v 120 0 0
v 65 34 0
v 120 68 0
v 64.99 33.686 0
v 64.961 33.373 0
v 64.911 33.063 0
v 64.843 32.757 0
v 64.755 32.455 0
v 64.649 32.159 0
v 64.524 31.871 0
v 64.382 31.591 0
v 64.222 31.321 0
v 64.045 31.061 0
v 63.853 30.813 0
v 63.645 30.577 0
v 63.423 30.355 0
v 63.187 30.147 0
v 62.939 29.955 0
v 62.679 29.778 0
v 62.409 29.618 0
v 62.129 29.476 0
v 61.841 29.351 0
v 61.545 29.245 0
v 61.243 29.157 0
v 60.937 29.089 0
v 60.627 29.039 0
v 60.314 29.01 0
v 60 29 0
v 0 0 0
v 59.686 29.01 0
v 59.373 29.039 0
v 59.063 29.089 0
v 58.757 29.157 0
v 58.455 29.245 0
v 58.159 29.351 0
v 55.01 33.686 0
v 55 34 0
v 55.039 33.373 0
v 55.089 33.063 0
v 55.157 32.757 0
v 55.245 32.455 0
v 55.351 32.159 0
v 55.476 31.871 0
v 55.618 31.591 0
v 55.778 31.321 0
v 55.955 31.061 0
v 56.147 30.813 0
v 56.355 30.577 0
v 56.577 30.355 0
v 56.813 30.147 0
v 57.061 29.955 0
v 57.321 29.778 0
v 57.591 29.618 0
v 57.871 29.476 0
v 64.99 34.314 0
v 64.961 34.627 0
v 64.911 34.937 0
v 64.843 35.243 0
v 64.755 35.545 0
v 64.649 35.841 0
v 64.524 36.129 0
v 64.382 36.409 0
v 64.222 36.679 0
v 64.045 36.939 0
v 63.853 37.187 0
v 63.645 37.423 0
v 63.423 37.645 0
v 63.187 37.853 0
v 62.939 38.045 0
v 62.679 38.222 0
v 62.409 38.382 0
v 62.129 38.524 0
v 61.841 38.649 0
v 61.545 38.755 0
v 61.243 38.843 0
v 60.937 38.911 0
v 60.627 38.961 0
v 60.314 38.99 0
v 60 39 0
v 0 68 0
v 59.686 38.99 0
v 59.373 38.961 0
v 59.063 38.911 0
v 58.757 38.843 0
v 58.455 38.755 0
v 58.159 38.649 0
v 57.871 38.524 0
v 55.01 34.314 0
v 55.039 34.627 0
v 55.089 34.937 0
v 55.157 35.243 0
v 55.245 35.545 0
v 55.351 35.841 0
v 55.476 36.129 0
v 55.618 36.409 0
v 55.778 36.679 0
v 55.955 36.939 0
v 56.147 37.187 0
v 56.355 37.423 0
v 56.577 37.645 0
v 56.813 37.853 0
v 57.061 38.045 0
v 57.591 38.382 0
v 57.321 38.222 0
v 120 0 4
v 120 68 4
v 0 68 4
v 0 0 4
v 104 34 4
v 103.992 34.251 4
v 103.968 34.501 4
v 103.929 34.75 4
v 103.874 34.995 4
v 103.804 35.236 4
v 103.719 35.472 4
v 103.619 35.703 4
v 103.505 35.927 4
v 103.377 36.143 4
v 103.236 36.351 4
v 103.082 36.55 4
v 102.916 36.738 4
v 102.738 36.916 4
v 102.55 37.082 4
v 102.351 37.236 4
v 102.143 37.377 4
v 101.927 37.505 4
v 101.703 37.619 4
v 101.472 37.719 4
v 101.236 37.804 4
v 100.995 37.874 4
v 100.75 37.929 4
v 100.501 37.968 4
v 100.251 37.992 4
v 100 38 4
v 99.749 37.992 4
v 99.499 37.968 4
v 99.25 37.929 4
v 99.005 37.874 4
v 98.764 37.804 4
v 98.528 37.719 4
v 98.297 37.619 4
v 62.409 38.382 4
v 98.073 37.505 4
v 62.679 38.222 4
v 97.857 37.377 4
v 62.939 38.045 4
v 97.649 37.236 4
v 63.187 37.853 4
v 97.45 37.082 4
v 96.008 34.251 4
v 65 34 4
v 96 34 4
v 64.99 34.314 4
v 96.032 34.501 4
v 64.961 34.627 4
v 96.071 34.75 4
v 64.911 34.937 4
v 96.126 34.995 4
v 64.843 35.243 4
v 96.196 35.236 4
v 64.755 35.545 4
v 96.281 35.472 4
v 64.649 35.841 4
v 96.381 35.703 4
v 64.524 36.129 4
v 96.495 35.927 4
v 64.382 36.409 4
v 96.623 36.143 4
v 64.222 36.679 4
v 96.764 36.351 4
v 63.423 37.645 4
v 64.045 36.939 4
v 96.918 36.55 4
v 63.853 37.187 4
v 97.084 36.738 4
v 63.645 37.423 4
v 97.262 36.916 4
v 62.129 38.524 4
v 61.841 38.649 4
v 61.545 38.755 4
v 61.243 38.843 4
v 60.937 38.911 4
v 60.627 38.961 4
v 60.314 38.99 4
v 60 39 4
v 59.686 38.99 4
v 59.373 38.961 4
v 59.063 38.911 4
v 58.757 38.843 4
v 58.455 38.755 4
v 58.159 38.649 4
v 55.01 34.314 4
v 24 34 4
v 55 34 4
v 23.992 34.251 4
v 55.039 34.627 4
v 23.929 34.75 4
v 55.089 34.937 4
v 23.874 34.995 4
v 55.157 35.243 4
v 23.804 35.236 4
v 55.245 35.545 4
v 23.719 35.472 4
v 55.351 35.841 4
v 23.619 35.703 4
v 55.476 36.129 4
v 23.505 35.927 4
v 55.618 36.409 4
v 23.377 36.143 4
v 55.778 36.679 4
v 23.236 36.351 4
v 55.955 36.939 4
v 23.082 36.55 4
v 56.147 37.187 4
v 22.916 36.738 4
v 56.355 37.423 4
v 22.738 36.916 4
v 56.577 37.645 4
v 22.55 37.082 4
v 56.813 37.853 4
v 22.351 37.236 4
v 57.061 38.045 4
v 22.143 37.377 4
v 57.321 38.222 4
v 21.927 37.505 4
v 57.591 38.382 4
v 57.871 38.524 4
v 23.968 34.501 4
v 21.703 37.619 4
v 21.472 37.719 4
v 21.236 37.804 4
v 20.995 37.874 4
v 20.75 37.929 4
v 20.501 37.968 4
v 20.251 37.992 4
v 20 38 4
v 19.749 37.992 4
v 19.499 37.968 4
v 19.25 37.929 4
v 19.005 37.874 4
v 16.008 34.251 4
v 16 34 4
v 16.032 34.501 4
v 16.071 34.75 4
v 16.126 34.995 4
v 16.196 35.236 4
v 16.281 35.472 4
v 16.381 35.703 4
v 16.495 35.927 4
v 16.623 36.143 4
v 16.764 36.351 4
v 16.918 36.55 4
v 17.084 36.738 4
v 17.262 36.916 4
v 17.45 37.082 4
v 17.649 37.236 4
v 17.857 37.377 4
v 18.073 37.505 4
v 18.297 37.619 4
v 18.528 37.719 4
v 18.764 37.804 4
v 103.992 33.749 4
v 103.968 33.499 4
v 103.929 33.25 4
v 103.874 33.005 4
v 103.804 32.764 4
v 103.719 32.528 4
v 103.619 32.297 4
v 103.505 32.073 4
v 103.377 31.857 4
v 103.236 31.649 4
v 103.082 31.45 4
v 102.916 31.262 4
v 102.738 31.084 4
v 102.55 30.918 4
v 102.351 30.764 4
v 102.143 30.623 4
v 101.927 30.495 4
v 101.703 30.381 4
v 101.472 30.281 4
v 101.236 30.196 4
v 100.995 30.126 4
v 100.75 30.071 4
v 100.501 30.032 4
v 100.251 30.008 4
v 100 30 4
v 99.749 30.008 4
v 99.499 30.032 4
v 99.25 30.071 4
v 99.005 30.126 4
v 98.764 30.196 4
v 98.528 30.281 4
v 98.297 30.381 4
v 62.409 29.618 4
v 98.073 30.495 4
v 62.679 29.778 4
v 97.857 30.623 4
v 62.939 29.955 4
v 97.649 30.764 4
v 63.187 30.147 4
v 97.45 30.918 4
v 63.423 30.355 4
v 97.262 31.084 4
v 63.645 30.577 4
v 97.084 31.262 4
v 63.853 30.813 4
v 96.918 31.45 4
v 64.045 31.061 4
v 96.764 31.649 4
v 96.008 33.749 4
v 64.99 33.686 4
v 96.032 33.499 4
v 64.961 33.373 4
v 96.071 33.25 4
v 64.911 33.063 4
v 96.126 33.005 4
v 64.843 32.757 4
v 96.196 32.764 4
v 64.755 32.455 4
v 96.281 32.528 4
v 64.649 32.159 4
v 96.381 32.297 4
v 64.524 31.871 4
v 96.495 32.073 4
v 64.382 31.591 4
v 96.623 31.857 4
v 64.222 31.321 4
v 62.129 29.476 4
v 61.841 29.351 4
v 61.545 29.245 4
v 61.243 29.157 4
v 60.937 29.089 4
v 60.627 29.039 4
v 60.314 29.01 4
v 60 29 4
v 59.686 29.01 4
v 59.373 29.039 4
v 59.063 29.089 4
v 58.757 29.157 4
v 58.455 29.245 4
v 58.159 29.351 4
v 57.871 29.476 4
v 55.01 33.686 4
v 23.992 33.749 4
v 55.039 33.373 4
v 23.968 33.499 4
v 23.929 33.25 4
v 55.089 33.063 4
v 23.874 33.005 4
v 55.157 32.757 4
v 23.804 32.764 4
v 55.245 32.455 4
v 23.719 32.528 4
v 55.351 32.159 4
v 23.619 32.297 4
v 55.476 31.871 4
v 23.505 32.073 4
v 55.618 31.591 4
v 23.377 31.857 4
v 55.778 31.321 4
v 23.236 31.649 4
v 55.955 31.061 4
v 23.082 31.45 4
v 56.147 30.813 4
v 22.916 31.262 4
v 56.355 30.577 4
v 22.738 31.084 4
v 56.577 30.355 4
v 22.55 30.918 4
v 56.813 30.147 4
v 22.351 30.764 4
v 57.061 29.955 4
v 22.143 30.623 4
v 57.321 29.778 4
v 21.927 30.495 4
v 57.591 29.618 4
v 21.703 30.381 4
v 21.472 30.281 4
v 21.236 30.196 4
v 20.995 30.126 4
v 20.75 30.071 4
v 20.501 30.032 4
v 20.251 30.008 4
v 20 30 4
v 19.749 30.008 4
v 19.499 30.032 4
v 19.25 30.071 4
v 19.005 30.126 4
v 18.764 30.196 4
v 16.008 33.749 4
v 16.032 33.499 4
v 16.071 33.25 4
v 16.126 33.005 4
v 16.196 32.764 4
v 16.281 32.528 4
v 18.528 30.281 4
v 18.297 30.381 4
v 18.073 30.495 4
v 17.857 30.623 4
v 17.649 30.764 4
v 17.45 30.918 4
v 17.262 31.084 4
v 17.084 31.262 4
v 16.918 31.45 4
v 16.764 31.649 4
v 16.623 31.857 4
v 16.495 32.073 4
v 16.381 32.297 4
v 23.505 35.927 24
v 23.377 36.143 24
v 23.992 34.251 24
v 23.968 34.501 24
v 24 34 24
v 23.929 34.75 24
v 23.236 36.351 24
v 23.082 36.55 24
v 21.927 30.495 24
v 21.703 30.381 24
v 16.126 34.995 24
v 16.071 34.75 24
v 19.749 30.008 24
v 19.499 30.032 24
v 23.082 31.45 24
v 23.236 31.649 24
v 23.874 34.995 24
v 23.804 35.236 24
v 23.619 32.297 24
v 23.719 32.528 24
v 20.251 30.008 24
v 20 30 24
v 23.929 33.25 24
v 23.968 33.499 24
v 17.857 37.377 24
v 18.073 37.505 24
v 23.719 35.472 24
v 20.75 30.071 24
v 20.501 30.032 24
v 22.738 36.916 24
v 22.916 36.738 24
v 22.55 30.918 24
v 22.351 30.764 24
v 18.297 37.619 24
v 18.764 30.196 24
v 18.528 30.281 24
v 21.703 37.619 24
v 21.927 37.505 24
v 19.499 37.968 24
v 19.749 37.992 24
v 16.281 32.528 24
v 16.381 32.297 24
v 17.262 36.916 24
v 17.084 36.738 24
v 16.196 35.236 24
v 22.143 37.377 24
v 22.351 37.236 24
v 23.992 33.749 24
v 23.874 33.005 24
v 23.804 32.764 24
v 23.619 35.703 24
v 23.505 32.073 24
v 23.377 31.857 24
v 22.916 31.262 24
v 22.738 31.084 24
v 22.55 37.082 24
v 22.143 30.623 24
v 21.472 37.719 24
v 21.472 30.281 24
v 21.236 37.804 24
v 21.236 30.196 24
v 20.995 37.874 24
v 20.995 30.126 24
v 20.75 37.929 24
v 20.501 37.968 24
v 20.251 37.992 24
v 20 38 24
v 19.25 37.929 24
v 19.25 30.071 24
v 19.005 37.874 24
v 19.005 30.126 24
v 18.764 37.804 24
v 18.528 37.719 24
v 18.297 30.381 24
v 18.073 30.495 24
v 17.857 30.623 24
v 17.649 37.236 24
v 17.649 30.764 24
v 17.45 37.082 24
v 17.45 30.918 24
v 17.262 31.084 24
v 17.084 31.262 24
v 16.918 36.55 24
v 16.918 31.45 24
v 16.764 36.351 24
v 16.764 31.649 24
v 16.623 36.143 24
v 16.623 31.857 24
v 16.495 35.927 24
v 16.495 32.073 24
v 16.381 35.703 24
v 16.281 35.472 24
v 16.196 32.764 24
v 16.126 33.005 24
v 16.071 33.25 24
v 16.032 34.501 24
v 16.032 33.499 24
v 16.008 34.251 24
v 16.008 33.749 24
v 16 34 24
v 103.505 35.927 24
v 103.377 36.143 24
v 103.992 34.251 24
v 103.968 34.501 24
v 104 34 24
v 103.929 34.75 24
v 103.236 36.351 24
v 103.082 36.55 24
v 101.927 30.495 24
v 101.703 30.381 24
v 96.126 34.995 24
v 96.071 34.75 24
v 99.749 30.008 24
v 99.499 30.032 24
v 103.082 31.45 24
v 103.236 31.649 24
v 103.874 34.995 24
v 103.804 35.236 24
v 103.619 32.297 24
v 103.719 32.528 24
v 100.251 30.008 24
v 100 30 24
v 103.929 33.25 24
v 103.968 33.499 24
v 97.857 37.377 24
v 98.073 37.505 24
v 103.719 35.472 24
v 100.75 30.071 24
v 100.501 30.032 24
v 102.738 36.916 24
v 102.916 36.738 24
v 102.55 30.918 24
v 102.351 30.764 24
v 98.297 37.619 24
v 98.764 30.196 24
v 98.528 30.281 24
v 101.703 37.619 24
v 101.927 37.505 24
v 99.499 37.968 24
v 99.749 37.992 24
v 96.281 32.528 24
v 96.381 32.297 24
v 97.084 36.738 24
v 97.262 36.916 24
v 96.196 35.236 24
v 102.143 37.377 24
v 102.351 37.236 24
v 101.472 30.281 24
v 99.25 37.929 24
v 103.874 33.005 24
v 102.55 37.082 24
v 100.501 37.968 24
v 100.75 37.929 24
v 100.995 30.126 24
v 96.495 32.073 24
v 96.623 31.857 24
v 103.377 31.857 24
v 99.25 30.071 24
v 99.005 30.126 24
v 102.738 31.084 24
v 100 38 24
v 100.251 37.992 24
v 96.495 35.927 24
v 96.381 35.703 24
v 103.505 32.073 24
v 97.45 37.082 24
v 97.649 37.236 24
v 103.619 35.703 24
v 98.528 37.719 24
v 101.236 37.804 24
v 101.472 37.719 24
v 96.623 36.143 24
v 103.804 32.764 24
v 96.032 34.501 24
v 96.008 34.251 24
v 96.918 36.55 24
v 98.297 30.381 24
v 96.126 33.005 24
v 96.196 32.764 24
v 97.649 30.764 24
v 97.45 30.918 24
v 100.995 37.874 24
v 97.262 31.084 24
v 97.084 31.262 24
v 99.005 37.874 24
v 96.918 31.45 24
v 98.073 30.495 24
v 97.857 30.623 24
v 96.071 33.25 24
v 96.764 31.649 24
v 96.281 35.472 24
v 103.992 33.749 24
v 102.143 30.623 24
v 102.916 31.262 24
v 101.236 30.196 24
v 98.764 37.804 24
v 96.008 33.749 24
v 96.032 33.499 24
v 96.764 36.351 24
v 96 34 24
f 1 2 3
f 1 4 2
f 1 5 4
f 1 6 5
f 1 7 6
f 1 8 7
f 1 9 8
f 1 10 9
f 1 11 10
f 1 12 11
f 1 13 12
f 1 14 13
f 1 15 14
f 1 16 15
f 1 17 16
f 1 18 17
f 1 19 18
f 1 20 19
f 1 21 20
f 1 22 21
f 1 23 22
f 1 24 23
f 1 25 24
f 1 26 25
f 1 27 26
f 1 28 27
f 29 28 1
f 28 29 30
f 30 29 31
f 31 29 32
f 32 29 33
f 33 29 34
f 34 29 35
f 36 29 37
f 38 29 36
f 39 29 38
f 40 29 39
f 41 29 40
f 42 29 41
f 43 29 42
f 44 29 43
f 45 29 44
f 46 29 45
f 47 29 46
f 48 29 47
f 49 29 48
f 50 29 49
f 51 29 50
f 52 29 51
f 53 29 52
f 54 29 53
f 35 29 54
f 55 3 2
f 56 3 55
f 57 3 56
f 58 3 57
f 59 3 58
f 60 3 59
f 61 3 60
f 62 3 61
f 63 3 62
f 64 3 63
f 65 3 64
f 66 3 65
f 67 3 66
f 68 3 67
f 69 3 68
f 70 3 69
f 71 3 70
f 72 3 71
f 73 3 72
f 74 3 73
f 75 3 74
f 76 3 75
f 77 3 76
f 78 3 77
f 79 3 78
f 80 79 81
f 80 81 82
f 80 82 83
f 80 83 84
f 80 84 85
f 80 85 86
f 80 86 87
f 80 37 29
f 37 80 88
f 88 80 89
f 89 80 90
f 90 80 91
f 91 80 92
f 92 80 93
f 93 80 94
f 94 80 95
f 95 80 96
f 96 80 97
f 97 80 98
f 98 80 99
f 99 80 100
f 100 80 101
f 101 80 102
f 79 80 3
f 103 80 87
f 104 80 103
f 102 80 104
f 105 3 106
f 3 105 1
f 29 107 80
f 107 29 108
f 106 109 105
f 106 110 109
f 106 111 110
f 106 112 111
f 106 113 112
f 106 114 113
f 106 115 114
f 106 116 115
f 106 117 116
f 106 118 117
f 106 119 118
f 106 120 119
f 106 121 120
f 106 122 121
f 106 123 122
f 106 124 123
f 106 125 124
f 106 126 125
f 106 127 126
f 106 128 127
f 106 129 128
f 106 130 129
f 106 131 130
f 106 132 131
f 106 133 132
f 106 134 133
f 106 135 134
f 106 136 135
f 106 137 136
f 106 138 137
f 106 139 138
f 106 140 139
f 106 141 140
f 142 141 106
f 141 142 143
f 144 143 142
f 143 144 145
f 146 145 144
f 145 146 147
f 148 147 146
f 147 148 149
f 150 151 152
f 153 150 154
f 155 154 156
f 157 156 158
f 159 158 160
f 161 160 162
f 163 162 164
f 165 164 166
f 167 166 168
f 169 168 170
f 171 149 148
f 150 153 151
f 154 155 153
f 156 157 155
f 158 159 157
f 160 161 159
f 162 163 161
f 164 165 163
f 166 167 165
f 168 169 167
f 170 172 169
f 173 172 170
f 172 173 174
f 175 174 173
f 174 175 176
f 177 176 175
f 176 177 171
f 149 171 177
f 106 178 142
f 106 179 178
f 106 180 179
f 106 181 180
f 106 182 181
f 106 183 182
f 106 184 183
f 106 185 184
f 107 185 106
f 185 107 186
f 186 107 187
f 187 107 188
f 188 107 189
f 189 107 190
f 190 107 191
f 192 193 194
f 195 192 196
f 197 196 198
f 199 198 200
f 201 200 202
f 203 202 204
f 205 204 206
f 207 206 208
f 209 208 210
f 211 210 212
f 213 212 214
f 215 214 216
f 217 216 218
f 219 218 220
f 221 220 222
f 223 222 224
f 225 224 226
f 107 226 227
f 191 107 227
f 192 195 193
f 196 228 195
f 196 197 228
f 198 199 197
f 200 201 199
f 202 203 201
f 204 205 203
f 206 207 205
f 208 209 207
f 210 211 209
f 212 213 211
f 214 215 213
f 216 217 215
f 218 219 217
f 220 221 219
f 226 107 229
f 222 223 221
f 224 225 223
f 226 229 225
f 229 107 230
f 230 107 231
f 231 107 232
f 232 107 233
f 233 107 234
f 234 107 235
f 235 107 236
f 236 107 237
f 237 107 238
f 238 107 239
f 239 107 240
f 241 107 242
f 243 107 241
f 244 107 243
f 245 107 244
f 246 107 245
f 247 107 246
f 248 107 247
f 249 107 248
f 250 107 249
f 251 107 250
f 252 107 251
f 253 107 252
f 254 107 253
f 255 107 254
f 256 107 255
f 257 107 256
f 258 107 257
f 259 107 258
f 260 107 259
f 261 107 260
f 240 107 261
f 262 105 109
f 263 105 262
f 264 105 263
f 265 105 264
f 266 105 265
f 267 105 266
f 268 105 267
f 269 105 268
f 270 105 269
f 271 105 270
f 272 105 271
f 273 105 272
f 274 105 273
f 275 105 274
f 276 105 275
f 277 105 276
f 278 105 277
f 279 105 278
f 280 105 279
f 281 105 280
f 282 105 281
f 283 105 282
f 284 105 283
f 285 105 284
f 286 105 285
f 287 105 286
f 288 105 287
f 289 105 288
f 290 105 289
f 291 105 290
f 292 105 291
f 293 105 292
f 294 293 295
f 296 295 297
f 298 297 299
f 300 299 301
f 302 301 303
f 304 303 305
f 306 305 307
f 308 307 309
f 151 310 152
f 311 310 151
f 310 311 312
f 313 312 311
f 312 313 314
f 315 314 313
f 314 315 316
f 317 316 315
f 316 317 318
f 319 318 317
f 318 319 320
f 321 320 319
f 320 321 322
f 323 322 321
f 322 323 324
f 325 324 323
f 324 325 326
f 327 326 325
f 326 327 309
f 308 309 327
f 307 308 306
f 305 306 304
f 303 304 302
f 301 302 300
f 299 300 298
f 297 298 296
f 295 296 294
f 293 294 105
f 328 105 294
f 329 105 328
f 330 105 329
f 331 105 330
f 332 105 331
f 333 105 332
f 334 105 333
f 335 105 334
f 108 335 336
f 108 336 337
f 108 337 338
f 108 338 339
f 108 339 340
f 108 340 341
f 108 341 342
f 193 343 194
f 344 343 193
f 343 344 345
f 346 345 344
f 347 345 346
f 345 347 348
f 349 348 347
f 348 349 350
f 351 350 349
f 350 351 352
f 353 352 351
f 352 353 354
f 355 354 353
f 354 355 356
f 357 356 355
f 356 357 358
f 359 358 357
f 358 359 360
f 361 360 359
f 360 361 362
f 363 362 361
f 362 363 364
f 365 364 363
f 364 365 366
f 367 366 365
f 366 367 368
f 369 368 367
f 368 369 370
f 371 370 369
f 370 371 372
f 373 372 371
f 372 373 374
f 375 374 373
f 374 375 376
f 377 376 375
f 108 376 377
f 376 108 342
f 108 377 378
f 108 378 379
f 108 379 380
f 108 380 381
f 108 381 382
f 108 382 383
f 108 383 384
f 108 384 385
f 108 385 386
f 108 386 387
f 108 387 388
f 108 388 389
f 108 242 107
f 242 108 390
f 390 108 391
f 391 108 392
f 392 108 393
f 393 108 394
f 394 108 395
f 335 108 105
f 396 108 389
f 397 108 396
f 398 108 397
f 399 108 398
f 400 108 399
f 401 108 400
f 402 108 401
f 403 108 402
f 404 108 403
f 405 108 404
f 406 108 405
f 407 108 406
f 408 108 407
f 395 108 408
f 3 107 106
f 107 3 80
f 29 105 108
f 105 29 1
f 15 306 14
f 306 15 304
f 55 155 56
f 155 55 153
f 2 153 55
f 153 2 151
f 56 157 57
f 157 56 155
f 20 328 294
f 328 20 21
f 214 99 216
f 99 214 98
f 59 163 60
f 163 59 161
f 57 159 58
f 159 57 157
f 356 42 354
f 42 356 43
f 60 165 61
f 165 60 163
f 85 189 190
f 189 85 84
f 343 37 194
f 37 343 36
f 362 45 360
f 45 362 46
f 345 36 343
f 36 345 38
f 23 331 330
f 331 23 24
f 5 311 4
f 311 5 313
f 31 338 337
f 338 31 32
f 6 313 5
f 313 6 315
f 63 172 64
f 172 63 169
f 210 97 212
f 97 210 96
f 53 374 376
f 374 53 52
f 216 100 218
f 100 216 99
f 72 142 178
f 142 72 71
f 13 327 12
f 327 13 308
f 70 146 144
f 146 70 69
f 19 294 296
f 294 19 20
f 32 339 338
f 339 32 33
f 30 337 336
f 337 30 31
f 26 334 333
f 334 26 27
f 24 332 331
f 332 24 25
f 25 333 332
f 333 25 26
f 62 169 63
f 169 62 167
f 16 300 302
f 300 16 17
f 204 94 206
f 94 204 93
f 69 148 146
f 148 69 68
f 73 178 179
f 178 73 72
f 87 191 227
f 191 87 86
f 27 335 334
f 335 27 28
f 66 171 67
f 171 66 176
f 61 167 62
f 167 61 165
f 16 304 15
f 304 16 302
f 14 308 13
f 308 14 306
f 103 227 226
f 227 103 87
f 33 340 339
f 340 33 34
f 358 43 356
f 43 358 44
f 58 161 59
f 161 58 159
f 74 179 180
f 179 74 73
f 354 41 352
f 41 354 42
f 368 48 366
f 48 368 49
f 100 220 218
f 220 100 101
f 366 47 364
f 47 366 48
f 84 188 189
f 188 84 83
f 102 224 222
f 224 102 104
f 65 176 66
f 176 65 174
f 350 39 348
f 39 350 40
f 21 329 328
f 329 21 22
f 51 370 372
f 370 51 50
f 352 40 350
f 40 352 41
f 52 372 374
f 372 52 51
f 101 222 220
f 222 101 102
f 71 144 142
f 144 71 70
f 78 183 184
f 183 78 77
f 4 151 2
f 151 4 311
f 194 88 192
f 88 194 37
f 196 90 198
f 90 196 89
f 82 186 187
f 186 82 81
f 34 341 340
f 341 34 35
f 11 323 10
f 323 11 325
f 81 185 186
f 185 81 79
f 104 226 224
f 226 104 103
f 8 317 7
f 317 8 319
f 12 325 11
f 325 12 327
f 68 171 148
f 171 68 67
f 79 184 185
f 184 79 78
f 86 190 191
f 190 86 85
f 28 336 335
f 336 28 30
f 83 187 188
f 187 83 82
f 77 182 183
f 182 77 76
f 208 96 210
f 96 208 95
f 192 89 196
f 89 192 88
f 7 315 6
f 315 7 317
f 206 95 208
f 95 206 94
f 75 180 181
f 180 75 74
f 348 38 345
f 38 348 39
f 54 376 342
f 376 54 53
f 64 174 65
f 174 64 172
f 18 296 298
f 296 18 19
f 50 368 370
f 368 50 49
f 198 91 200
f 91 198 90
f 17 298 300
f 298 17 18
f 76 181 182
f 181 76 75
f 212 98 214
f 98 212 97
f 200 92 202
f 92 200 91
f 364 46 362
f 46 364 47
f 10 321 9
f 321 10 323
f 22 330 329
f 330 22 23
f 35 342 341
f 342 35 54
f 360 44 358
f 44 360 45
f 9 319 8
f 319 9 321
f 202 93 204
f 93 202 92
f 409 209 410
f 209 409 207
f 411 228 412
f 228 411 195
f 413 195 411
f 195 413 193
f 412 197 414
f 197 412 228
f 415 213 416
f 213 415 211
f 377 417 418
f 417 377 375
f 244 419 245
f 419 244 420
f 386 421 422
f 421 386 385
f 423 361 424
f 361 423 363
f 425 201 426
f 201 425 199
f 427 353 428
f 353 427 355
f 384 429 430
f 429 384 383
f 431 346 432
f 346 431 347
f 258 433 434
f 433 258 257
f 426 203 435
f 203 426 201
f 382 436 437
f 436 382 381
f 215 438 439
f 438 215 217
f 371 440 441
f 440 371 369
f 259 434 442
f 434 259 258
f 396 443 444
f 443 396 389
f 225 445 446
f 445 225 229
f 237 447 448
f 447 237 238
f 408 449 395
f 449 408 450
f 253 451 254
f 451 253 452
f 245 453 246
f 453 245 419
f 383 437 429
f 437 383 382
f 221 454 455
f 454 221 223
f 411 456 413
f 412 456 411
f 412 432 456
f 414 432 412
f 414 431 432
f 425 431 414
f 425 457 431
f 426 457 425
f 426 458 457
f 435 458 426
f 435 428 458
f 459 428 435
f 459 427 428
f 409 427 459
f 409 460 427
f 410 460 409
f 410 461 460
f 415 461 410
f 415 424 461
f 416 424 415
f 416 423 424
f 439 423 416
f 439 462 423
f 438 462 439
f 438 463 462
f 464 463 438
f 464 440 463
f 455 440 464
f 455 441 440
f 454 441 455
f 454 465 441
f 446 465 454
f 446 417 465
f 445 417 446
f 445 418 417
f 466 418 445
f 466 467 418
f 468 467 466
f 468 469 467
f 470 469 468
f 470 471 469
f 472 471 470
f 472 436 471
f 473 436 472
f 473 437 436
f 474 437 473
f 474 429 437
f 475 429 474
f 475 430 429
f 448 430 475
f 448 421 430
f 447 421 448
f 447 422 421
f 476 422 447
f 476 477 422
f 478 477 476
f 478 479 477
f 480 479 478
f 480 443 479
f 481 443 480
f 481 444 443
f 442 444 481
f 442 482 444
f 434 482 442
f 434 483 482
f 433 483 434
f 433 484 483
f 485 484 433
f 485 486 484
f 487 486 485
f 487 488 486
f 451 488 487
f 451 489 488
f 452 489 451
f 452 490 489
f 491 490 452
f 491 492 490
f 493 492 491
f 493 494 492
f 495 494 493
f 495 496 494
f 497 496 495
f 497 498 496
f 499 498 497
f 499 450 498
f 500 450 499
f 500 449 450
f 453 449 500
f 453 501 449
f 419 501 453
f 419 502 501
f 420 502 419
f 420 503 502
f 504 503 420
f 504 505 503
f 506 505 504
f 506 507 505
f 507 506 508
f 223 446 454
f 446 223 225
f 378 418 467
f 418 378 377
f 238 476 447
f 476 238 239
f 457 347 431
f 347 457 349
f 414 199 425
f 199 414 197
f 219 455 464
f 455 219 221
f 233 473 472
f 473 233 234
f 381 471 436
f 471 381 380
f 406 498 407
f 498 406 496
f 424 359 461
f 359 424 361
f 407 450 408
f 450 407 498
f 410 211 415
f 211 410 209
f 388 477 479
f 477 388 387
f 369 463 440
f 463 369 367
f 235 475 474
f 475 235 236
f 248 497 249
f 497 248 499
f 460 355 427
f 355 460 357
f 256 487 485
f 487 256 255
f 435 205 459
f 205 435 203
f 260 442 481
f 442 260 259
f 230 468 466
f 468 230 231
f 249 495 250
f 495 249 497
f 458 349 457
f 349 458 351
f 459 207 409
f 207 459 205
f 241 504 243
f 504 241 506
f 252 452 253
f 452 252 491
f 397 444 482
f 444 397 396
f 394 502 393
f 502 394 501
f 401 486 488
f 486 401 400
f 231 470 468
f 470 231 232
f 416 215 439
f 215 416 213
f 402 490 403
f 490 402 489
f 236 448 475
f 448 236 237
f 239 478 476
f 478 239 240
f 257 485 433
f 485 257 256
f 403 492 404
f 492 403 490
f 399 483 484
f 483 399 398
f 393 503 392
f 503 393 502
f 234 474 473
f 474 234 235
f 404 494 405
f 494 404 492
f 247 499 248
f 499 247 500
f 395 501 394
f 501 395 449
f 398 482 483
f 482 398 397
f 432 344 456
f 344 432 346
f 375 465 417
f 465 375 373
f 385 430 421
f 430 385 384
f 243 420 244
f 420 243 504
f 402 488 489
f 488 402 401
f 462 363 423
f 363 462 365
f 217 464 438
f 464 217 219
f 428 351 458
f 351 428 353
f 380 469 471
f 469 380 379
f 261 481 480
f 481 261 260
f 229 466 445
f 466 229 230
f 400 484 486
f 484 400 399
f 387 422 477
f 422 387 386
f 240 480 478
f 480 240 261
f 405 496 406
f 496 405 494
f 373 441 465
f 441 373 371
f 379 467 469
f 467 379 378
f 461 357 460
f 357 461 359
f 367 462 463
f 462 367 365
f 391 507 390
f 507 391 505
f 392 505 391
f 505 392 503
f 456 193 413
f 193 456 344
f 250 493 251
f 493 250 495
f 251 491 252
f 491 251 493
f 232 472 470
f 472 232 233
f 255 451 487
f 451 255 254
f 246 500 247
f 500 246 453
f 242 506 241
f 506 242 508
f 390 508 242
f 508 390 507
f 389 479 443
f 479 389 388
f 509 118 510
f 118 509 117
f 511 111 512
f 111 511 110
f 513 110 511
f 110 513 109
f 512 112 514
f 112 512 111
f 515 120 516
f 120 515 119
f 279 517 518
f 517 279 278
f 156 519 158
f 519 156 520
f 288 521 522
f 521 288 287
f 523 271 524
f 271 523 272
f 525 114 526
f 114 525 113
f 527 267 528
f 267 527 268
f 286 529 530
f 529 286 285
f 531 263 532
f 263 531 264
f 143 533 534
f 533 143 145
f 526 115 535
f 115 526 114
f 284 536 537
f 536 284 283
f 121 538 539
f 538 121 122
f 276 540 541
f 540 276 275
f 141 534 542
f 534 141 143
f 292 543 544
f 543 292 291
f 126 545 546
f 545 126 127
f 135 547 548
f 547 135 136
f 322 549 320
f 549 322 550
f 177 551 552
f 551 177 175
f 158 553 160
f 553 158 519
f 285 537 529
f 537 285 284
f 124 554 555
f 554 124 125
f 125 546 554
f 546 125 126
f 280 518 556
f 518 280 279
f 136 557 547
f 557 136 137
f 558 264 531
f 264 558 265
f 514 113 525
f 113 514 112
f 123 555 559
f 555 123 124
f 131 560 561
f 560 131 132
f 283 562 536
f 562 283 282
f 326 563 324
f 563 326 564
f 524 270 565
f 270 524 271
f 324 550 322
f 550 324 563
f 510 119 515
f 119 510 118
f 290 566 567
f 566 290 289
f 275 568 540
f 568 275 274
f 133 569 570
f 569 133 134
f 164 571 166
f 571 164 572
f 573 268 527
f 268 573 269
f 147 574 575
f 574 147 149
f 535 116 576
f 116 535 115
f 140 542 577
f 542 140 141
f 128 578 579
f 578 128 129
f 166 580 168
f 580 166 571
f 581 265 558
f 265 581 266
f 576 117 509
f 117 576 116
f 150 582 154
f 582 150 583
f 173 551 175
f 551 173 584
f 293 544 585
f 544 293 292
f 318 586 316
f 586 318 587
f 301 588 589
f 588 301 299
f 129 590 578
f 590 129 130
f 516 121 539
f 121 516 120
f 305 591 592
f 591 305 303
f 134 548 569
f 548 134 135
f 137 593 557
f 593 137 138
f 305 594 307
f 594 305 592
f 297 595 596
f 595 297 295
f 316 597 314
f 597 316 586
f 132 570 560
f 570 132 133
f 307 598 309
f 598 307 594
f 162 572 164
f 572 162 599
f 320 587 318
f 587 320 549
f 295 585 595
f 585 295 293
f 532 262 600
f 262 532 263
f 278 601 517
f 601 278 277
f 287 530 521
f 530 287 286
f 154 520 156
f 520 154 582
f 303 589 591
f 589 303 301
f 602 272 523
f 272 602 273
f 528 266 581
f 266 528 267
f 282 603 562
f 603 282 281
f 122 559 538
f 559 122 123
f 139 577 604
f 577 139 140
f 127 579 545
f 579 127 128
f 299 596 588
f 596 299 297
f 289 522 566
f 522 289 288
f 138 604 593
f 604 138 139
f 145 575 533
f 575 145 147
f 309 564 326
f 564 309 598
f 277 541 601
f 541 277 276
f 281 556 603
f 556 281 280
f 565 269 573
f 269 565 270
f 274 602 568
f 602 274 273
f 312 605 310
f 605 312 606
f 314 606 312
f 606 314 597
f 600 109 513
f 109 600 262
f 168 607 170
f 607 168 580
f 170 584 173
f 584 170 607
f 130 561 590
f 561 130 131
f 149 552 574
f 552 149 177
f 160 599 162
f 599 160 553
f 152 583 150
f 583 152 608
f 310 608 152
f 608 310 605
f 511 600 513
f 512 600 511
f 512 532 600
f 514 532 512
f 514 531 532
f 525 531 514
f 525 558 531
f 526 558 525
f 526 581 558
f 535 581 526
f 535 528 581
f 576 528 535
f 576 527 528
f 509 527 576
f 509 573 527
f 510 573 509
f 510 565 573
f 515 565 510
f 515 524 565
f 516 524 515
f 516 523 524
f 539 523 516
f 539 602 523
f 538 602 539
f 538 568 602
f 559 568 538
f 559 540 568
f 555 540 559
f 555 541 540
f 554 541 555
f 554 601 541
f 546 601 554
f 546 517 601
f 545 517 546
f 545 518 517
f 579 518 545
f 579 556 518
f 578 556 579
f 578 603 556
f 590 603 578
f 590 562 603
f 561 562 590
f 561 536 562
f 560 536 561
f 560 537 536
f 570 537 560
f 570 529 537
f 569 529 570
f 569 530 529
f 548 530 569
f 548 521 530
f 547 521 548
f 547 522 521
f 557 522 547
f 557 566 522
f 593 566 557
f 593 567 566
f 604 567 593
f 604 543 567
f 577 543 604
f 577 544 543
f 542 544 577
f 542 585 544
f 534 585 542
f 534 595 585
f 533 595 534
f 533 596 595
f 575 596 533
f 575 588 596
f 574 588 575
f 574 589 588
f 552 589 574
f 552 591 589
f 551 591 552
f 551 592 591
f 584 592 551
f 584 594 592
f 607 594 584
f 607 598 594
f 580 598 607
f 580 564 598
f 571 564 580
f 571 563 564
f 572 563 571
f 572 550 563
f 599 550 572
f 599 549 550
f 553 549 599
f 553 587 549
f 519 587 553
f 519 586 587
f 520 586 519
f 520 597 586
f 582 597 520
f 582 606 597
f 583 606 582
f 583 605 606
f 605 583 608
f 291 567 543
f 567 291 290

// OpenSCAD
$fn=100;

module razor_head_bottom(r=20) {

	cy_r=r;
	cy_h=r*3;

		translate([0,0,4]) {
			rotate([0,0,0]) {
		
				union() {
			
					difference() {
						translate([0,0, 0]) {
							rotate([0,90,0]) {
								cube([4, 68, 120]);
							}
						}
			
						//center hole
						translate([60,34,-5]) {
							rotate([0,0,0]) {
								cylinder(r = 5, h=25);
							}
						}
					}//diff
	
					//side pegs
					translate([20,34,-4]) {
						rotate([0,0,0]) {
							cylinder(r = 4, h=24);
						}
					}
	
					//side pegs
					translate([100,34,-4]) {
						rotate([0,0,0]) {
							cylinder(r = 4, h=24);
						}
					}
			}//union
		}
	}
}
razor_head_bottom();
